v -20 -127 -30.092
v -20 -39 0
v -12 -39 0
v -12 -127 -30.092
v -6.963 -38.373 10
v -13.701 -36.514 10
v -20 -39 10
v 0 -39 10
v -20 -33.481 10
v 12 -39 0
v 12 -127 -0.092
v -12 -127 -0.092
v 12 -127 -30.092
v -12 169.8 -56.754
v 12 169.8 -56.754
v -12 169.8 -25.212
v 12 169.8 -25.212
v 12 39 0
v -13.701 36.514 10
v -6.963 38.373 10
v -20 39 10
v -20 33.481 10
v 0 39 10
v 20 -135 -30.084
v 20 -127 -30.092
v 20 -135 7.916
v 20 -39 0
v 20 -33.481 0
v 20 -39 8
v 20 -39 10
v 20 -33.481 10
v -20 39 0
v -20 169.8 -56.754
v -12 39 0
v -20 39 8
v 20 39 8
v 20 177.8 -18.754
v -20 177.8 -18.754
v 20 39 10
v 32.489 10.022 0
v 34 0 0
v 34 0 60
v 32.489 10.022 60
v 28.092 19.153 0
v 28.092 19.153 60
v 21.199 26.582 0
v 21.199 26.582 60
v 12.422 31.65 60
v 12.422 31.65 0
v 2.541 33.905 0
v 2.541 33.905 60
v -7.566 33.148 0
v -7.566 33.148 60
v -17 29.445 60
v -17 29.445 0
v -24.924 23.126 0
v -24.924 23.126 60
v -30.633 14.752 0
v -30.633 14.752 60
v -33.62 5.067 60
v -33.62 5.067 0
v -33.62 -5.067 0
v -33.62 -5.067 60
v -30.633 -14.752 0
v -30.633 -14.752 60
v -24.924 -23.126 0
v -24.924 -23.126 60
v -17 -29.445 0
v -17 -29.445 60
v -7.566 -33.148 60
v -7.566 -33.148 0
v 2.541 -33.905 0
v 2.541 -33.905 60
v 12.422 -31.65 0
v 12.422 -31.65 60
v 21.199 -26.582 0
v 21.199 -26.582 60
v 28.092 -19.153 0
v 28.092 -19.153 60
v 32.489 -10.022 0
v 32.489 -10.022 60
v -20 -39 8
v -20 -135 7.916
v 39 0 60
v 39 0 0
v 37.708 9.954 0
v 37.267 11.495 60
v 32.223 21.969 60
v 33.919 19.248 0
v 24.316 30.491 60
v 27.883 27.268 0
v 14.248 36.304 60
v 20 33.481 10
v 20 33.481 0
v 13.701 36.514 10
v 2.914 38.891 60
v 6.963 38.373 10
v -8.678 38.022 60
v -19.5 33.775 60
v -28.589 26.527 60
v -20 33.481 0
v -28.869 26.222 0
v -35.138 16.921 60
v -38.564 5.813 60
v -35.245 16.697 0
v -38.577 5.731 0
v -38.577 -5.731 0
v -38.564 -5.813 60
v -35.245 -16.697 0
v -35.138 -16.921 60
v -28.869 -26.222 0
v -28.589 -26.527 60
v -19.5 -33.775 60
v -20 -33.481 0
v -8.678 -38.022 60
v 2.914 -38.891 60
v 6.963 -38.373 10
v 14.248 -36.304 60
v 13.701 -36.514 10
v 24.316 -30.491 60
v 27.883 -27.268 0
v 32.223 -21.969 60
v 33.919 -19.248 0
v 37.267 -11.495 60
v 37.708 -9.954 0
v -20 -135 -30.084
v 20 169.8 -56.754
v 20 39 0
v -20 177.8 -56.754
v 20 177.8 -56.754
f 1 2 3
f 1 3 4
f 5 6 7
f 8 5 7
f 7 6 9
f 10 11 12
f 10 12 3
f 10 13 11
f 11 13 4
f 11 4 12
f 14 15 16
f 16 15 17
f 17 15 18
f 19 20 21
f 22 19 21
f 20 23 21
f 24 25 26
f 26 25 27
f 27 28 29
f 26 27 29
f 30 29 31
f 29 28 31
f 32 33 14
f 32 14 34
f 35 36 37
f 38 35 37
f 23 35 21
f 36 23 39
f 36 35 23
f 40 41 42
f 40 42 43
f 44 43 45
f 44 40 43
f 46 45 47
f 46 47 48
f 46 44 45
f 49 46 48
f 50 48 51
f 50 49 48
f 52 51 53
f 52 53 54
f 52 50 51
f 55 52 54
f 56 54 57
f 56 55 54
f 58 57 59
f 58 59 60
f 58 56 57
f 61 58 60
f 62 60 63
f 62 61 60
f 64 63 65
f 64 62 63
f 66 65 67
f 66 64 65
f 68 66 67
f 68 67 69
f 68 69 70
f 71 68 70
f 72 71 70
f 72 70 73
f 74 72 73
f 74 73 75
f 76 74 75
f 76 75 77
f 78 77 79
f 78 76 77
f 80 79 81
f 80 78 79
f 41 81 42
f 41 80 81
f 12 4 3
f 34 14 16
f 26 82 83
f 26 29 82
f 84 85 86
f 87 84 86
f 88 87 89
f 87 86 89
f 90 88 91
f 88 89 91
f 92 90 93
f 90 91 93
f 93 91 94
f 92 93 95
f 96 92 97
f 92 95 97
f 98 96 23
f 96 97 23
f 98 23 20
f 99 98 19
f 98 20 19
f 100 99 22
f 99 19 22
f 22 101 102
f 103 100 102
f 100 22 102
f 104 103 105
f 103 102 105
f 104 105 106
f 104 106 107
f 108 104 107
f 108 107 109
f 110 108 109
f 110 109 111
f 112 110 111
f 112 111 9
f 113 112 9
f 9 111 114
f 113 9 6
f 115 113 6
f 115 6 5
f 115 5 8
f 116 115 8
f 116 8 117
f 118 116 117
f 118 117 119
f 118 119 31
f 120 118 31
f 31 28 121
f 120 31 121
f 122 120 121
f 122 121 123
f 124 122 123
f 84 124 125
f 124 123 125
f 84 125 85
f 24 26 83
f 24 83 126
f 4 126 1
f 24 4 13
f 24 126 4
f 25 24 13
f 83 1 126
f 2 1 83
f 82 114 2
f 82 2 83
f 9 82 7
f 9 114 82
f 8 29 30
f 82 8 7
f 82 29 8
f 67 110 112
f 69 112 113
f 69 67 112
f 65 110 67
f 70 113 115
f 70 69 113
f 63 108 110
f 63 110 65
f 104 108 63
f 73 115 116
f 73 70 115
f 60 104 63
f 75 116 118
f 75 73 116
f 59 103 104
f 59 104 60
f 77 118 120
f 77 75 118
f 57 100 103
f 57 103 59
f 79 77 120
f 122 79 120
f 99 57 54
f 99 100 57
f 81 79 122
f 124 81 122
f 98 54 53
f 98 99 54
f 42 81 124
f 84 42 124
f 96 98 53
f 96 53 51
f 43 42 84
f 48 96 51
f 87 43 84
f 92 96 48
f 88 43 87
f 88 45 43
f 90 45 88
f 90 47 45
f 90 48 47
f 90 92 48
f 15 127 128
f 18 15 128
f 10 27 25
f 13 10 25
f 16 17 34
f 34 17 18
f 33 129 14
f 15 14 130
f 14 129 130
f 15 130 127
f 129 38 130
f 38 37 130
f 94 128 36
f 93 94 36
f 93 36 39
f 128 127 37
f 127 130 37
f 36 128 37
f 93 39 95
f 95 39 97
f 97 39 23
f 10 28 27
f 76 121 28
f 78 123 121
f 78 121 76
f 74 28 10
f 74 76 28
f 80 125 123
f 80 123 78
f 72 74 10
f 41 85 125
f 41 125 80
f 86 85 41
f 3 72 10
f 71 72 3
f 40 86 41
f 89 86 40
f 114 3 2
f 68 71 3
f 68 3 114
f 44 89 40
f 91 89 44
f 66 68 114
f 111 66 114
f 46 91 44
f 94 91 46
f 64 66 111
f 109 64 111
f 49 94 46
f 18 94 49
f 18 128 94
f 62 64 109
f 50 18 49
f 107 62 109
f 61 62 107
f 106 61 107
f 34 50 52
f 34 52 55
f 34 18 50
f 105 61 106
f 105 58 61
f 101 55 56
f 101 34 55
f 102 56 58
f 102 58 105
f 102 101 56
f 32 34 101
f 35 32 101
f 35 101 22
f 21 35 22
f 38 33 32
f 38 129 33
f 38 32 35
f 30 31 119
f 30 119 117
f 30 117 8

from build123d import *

# Parameters (mm, degrees)
SKETCH2_R           = 39
SKETCH2_R_2         = 34
BOSS_EXTRUDE1_DEPTH = 60
BOSS_EXTRUDE2_DEPTH = 20
BOSS_EXTRUDE3_DEPTH = 10
BOSS_EXTRUDE4_DEPTH = 20
BOSS_EXTRUDE5_DEPTH = 10
BOSS_EXTRUDE6_DEPTH = 8
BOSS_EXTRUDE7_DEPTH = 8
BOSS_EXTRUDE8_DEPTH = 8
BOSS_EXTRUDE9_DEPTH = 8


with BuildPart() as part:
    # Sketch2 → Boss-Extrude1 (new body)
    with BuildSketch(Plane.XY):
        Circle(SKETCH2_R)
        Circle(SKETCH2_R_2, mode=Mode.SUBTRACT)
    extrude(amount=BOSS_EXTRUDE1_DEPTH)



with BuildPart() as body_2:
    # Sketch4 → Boss-Extrude2 (new, symmetric)
    with BuildSketch(Plane(origin=(0, 0, 0), x_dir=(0, 0, -1), z_dir=(1, 0, 0))):
        Polygon((-8, 39), (18.753791407, 177.8), (56.753791407, 177.8), (56.753791407, 169.8), (25.211786138, 169.8), (0, 39), align=None)
    extrude(amount=BOSS_EXTRUDE2_DEPTH, both=True)


with BuildPart() as part_1:
    add(part.part)

    add(body_2.part)  # Boss-Extrude3 merges body 2
    # Sketch5 → Boss-Extrude3 (add)
    with BuildSketch(Plane(origin=(0, 0, 0), x_dir=(-1, 0, 0), z_dir=(0, 0, -1))):
        with BuildLine():
            Line((0, 39), (-20, 39))
            Line((-20, 39), (-20, 33.481338086))
            ThreePointArc((-20, 33.481338086), (-10.373712322, 37.595027499), (0, 39))
        make_face()
        with BuildLine():
            Line((20, 39), (0, 39))
            ThreePointArc((0, 39), (10.373712322, 37.595027499), (20, 33.481338086))
            Line((20, 33.481338086), (20, 39))
        make_face()
    extrude(amount=-BOSS_EXTRUDE3_DEPTH)



with BuildPart() as body_2_2:
    # Sketch7 → Boss-Extrude4 (new, symmetric)
    with BuildSketch(Plane(origin=(0, 0, 0), x_dir=(0, 0, -1), z_dir=(1, 0, 0))):
        Polygon((-8, -39), (-7.916224207, -134.999963446), (30.083775793, -134.999963446), (30.092153418, -127), (0.092153418, -127), (0, -39), align=None)
    extrude(amount=BOSS_EXTRUDE4_DEPTH, both=True)


with BuildPart() as part_2:
    add(part_1.part)

    add(body_2_2.part)  # Boss-Extrude5 merges body 2 2
    # Sketch8 → Boss-Extrude5 (add)
    with BuildSketch(Plane(origin=(0, 0, 0), x_dir=(-1, 0, 0), z_dir=(0, 0, -1))):
        with BuildLine():
            Line((-20, -33.481338086), (-20, -39))
            Line((-20, -39), (0, -39))
            ThreePointArc((0, -39), (-10.373712322, -37.595027499), (-20, -33.481338086))
        make_face()
        with BuildLine():
            ThreePointArc((20, -33.481338086), (10.373712322, -37.595027499), (0, -39))
            Line((0, -39), (20, -39))
            Line((20, -39), (20, -33.481338086))
        make_face()
    extrude(amount=-BOSS_EXTRUDE5_DEPTH)

    # Sketch9 → Boss-Extrude6 (add)
    with BuildSketch(Plane(origin=(20, 0, 0), x_dir=(0, 0, -1), z_dir=(1, 0, 0))):
        Polygon((56.753791407, 169.8), (0, 39), (25.211786138, 169.8), align=None)
    extrude(amount=-BOSS_EXTRUDE6_DEPTH)

    # Sketch10 → Boss-Extrude7 (add)
    with BuildSketch(Plane.ZY.offset(20)):
        Polygon((0, 39), (-25.211786138, 169.8), (-56.753791407, 169.8), align=None)
    extrude(amount=-BOSS_EXTRUDE7_DEPTH)

    # Sketch11 → Boss-Extrude8 (add)
    with BuildSketch(Plane(origin=(20, 0, 0), x_dir=(0, 0, -1), z_dir=(1, 0, 0))):
        Polygon((0, -39), (30.092153418, -127), (0.092153418, -127), align=None)
    extrude(amount=-BOSS_EXTRUDE8_DEPTH)

    # Sketch12 → Boss-Extrude9 (add)
    with BuildSketch(Plane.ZY.offset(20)):
        Polygon((-30.092153418, -127), (-0.092153418, -127), (0, -39), align=None)
    extrude(amount=-BOSS_EXTRUDE9_DEPTH)


solid = part_2.part
